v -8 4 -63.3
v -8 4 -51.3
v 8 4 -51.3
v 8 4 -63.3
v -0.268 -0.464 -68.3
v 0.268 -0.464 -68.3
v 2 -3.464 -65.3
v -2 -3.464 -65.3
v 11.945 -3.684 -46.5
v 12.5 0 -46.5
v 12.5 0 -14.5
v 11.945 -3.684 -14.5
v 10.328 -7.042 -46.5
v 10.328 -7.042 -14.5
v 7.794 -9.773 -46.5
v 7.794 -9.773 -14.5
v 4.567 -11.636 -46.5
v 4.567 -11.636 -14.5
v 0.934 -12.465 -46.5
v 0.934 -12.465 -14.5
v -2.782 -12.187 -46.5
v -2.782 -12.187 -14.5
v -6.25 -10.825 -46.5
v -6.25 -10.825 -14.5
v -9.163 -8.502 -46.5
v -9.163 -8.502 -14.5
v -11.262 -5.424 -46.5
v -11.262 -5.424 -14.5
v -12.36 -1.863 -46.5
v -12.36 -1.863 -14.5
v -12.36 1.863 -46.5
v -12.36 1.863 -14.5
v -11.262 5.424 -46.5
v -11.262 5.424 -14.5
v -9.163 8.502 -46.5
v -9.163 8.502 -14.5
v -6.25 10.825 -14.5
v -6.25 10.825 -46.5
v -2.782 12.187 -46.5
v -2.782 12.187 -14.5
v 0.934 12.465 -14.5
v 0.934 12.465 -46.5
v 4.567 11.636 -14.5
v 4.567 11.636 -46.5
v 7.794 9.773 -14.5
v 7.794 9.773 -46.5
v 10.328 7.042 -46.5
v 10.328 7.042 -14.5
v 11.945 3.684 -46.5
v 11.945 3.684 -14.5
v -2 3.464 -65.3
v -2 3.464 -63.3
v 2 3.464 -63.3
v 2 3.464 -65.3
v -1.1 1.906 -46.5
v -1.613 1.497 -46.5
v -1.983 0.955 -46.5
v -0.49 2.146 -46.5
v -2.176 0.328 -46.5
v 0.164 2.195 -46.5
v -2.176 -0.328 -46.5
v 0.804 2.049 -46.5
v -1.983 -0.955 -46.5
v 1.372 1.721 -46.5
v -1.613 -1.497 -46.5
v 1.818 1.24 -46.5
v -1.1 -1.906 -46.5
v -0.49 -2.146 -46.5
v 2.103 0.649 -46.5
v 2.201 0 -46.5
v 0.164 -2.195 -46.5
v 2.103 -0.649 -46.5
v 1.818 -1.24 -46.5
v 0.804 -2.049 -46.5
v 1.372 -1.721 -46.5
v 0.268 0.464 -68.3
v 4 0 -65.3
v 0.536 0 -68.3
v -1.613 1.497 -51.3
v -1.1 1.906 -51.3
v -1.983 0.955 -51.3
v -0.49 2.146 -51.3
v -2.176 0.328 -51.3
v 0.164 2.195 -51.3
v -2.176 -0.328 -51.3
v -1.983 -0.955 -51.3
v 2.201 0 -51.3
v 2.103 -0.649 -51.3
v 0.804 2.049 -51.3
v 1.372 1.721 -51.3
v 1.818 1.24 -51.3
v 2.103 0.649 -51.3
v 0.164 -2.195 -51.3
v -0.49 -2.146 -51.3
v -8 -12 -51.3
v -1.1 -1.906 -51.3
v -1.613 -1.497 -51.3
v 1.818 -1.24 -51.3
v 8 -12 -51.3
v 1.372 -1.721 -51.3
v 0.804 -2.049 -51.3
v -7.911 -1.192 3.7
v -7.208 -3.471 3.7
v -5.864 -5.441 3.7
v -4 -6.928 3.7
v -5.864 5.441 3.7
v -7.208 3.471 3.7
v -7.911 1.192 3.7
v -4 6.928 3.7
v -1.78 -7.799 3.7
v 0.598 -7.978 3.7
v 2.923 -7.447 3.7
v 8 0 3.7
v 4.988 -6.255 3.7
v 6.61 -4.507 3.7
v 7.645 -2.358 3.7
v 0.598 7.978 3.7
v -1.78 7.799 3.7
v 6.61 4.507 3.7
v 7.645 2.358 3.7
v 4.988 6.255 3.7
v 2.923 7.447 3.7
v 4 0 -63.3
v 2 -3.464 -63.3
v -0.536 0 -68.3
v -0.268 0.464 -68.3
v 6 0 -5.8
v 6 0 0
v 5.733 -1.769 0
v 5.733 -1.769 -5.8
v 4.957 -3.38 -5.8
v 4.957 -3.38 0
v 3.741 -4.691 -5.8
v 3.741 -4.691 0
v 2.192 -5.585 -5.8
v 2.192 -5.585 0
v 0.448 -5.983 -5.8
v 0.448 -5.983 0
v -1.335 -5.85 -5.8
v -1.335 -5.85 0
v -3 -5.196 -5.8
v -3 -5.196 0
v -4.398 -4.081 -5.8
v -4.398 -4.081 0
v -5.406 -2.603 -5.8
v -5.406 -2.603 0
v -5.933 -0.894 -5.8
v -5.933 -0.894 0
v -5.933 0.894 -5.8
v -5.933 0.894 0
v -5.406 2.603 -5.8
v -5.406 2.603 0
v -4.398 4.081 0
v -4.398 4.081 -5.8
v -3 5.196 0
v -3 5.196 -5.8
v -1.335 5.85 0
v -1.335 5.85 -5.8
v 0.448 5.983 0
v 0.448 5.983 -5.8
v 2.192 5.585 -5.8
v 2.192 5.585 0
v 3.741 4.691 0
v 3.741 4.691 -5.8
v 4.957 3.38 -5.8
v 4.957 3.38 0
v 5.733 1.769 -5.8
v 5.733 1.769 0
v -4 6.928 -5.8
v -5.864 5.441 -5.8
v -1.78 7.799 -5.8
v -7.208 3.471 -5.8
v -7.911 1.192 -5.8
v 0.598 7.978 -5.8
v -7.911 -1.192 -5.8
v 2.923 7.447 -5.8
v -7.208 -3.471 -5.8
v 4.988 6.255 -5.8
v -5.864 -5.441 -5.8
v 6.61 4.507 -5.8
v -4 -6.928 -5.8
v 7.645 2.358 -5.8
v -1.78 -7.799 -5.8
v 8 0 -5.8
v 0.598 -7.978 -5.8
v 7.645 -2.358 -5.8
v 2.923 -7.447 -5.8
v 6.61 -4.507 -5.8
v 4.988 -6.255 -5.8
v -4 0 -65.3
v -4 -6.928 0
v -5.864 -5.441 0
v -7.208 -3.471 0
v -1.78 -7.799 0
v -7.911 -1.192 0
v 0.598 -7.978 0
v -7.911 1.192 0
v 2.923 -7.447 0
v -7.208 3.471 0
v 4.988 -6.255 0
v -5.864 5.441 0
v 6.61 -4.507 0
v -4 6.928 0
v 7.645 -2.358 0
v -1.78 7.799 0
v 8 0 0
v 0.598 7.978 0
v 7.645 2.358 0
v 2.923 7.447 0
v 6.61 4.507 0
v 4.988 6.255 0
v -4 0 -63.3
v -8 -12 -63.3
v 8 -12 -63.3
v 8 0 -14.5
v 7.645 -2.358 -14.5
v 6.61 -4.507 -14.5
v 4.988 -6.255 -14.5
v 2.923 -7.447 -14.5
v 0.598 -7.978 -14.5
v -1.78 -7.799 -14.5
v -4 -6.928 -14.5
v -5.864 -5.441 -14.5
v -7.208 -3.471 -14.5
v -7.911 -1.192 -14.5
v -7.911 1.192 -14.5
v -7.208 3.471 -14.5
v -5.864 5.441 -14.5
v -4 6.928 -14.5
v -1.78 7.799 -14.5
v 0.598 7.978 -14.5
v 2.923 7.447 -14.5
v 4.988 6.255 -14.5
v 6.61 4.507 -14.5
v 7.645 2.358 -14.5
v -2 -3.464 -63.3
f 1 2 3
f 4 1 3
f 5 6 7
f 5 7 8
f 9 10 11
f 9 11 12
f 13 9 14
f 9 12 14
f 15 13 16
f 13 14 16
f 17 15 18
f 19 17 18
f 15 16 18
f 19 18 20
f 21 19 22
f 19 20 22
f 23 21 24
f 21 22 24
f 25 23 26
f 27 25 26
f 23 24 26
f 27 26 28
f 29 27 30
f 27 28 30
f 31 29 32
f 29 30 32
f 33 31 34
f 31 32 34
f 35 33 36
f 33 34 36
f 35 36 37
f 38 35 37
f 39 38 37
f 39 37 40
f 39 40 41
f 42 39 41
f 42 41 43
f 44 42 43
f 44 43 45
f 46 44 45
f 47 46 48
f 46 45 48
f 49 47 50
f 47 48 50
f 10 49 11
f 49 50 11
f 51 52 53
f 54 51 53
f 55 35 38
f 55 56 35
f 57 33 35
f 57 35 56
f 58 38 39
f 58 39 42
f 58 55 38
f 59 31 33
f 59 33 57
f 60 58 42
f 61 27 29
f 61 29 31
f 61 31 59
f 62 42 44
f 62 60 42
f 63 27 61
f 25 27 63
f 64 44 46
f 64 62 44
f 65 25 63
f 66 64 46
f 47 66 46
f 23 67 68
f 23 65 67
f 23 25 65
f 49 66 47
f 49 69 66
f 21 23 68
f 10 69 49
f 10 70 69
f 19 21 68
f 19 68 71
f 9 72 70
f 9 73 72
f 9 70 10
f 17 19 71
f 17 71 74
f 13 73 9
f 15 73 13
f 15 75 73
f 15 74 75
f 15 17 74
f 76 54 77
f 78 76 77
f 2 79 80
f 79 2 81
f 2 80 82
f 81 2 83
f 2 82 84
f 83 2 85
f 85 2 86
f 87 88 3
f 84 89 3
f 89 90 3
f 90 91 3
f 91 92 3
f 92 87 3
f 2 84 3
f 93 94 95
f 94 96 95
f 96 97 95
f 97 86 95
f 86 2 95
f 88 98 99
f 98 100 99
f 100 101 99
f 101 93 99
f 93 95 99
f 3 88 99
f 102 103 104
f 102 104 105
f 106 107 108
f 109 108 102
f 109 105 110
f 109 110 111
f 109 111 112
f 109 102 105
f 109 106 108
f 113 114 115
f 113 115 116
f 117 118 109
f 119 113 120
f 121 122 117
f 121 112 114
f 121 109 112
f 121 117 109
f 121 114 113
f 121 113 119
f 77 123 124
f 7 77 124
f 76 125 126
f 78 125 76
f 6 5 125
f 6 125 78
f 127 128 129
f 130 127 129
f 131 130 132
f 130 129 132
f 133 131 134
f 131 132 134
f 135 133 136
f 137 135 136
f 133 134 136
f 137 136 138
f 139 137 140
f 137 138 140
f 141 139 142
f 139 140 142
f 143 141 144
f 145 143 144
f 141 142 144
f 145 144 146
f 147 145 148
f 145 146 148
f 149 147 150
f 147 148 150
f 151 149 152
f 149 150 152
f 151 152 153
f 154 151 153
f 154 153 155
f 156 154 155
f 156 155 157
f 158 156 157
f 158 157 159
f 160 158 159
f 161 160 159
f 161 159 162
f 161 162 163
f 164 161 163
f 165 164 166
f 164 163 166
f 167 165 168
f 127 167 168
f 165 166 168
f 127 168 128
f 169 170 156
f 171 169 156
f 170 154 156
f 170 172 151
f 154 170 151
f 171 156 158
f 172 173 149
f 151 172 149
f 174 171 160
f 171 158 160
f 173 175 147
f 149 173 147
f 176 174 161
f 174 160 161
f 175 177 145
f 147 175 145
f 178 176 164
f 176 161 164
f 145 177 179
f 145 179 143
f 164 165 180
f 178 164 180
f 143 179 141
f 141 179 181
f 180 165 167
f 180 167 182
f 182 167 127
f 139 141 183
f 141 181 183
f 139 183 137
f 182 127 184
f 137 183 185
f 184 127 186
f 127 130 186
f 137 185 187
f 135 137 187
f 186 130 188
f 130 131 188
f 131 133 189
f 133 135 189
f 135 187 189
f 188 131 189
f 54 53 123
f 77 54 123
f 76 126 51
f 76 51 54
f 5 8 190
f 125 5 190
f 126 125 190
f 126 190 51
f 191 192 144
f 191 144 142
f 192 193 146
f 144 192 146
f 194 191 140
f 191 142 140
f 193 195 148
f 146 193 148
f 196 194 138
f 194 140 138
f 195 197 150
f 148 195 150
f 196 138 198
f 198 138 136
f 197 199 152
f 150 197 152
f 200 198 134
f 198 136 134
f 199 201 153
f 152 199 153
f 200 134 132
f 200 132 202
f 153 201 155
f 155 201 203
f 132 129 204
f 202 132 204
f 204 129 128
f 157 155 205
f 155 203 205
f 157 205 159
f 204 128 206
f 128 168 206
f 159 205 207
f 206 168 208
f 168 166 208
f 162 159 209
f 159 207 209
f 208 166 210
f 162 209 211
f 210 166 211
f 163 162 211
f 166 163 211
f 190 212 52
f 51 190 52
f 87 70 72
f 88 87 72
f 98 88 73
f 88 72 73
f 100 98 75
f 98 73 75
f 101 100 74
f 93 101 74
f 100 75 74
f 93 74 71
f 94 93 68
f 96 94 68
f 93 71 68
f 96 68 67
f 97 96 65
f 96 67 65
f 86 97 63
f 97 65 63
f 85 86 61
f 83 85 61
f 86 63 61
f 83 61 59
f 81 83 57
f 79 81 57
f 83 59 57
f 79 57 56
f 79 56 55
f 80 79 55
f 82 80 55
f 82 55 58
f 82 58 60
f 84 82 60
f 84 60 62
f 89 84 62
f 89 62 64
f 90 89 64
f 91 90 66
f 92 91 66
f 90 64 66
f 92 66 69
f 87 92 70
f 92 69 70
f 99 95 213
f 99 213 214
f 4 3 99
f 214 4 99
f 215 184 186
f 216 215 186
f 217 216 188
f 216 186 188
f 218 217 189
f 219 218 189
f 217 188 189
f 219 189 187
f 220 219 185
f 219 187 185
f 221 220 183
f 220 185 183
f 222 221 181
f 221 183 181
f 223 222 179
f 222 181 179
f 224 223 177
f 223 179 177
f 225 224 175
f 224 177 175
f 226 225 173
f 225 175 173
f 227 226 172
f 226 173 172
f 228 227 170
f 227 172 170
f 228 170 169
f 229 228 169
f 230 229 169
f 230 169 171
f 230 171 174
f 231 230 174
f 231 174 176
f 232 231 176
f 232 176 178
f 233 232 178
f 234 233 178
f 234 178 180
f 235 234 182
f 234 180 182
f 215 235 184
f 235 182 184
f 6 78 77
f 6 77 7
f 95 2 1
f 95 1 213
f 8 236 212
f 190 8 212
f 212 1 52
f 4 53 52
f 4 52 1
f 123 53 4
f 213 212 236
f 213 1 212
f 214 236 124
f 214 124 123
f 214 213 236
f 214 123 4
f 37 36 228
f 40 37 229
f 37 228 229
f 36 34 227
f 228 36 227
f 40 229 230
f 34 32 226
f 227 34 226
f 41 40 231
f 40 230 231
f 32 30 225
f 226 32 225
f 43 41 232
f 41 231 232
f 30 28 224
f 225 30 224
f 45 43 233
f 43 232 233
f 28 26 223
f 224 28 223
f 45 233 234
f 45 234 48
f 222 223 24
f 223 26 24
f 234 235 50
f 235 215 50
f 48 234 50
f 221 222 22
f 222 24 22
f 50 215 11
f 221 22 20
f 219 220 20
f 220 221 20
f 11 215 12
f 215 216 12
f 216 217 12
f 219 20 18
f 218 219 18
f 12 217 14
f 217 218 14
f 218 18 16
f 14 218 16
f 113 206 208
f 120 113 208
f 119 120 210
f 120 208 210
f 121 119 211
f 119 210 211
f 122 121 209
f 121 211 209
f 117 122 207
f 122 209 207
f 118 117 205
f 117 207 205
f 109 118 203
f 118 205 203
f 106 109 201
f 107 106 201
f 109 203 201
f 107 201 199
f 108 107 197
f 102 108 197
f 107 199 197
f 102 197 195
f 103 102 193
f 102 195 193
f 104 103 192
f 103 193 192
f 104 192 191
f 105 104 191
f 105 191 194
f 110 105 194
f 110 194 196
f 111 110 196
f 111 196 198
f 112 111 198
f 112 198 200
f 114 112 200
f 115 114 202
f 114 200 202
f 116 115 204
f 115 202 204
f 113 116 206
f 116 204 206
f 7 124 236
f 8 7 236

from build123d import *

# Parameters (mm, degrees)
F0_R      = 8
F1_DEPTH  = 3.7
F2_R      = 6
F3_DEPTH  = 5.8
F4_R      = 8
F5_DEPTH  = 8.7
F6_R      = 12.5
F7_DEPTH  = 32
F8_R      = 2.200771
F9_DEPTH  = 4.8
F10_W     = 16
F10_H     = 16
F11_DEPTH = 12
F13_DEPTH = 5
F14_SIZE  = 3


with BuildPart() as f1:
    # F0 (on Top) → F1 (new body)
    with BuildSketch(Plane.XY):
        Circle(F0_R)
    extrude(amount=F1_DEPTH)

    # F2 (on face) → F3 (join)
    with BuildSketch(Plane(origin=(0, 0, 0), x_dir=(1, 0, 0), z_dir=(0, 0, -1))):
        Circle(F2_R)
    extrude(amount=F3_DEPTH)

    # F4 (on face) → F5 (join)
    with BuildSketch(Plane(origin=(0, 0, -5.8), x_dir=(1, 0, 0), z_dir=(0, 0, -1))):
        Circle(F4_R)
    extrude(amount=F5_DEPTH)

    # F6 (on face) → F7 (join)
    with BuildSketch(Plane(origin=(0, 0, -14.5), x_dir=(1, 0, 0), z_dir=(0, 0, -1))):
        Circle(F6_R)
    extrude(amount=F7_DEPTH)

    # F8 (on face) → F9 (join)
    with BuildSketch(Plane(origin=(0, 0, -46.5), x_dir=(1, 0, 0), z_dir=(0, 0, -1))):
        Circle(F8_R)
    extrude(amount=F9_DEPTH)

    # F10 (on face) → F11 (join)
    with BuildSketch(Plane(origin=(0, 0, -51.3), x_dir=(1, 0, 0), z_dir=(0, 0, -1))):
        with Locations((0, 4)):
            Rectangle(F10_W, F10_H)
    extrude(amount=F11_DEPTH)

    # F12 (on face) → F13 (join)
    with BuildSketch(Plane(origin=(0, 0, -63.3), x_dir=(1, 0, 0), z_dir=(0, 0, -1))):
        Polygon((2, 3.464102), (-2, 3.464102), (-4, 0), (-2, -3.464102), (2, -3.464102), (4, 0), align=None)
    extrude(amount=F13_DEPTH)

    # F14
    f14_edges = [f1.edges().sort_by_distance(p)[0] for p in [
        (0, -3.464102, -68.3),
        (-3, -1.732051, -68.3),
        (-3, 1.732051, -68.3),
        (0, 3.464102, -68.3),
        (3, 1.732051, -68.3),
        (3, -1.732051, -68.3),
    ]]
    chamfer(f14_edges, length=F14_SIZE)


solid = f1.part
